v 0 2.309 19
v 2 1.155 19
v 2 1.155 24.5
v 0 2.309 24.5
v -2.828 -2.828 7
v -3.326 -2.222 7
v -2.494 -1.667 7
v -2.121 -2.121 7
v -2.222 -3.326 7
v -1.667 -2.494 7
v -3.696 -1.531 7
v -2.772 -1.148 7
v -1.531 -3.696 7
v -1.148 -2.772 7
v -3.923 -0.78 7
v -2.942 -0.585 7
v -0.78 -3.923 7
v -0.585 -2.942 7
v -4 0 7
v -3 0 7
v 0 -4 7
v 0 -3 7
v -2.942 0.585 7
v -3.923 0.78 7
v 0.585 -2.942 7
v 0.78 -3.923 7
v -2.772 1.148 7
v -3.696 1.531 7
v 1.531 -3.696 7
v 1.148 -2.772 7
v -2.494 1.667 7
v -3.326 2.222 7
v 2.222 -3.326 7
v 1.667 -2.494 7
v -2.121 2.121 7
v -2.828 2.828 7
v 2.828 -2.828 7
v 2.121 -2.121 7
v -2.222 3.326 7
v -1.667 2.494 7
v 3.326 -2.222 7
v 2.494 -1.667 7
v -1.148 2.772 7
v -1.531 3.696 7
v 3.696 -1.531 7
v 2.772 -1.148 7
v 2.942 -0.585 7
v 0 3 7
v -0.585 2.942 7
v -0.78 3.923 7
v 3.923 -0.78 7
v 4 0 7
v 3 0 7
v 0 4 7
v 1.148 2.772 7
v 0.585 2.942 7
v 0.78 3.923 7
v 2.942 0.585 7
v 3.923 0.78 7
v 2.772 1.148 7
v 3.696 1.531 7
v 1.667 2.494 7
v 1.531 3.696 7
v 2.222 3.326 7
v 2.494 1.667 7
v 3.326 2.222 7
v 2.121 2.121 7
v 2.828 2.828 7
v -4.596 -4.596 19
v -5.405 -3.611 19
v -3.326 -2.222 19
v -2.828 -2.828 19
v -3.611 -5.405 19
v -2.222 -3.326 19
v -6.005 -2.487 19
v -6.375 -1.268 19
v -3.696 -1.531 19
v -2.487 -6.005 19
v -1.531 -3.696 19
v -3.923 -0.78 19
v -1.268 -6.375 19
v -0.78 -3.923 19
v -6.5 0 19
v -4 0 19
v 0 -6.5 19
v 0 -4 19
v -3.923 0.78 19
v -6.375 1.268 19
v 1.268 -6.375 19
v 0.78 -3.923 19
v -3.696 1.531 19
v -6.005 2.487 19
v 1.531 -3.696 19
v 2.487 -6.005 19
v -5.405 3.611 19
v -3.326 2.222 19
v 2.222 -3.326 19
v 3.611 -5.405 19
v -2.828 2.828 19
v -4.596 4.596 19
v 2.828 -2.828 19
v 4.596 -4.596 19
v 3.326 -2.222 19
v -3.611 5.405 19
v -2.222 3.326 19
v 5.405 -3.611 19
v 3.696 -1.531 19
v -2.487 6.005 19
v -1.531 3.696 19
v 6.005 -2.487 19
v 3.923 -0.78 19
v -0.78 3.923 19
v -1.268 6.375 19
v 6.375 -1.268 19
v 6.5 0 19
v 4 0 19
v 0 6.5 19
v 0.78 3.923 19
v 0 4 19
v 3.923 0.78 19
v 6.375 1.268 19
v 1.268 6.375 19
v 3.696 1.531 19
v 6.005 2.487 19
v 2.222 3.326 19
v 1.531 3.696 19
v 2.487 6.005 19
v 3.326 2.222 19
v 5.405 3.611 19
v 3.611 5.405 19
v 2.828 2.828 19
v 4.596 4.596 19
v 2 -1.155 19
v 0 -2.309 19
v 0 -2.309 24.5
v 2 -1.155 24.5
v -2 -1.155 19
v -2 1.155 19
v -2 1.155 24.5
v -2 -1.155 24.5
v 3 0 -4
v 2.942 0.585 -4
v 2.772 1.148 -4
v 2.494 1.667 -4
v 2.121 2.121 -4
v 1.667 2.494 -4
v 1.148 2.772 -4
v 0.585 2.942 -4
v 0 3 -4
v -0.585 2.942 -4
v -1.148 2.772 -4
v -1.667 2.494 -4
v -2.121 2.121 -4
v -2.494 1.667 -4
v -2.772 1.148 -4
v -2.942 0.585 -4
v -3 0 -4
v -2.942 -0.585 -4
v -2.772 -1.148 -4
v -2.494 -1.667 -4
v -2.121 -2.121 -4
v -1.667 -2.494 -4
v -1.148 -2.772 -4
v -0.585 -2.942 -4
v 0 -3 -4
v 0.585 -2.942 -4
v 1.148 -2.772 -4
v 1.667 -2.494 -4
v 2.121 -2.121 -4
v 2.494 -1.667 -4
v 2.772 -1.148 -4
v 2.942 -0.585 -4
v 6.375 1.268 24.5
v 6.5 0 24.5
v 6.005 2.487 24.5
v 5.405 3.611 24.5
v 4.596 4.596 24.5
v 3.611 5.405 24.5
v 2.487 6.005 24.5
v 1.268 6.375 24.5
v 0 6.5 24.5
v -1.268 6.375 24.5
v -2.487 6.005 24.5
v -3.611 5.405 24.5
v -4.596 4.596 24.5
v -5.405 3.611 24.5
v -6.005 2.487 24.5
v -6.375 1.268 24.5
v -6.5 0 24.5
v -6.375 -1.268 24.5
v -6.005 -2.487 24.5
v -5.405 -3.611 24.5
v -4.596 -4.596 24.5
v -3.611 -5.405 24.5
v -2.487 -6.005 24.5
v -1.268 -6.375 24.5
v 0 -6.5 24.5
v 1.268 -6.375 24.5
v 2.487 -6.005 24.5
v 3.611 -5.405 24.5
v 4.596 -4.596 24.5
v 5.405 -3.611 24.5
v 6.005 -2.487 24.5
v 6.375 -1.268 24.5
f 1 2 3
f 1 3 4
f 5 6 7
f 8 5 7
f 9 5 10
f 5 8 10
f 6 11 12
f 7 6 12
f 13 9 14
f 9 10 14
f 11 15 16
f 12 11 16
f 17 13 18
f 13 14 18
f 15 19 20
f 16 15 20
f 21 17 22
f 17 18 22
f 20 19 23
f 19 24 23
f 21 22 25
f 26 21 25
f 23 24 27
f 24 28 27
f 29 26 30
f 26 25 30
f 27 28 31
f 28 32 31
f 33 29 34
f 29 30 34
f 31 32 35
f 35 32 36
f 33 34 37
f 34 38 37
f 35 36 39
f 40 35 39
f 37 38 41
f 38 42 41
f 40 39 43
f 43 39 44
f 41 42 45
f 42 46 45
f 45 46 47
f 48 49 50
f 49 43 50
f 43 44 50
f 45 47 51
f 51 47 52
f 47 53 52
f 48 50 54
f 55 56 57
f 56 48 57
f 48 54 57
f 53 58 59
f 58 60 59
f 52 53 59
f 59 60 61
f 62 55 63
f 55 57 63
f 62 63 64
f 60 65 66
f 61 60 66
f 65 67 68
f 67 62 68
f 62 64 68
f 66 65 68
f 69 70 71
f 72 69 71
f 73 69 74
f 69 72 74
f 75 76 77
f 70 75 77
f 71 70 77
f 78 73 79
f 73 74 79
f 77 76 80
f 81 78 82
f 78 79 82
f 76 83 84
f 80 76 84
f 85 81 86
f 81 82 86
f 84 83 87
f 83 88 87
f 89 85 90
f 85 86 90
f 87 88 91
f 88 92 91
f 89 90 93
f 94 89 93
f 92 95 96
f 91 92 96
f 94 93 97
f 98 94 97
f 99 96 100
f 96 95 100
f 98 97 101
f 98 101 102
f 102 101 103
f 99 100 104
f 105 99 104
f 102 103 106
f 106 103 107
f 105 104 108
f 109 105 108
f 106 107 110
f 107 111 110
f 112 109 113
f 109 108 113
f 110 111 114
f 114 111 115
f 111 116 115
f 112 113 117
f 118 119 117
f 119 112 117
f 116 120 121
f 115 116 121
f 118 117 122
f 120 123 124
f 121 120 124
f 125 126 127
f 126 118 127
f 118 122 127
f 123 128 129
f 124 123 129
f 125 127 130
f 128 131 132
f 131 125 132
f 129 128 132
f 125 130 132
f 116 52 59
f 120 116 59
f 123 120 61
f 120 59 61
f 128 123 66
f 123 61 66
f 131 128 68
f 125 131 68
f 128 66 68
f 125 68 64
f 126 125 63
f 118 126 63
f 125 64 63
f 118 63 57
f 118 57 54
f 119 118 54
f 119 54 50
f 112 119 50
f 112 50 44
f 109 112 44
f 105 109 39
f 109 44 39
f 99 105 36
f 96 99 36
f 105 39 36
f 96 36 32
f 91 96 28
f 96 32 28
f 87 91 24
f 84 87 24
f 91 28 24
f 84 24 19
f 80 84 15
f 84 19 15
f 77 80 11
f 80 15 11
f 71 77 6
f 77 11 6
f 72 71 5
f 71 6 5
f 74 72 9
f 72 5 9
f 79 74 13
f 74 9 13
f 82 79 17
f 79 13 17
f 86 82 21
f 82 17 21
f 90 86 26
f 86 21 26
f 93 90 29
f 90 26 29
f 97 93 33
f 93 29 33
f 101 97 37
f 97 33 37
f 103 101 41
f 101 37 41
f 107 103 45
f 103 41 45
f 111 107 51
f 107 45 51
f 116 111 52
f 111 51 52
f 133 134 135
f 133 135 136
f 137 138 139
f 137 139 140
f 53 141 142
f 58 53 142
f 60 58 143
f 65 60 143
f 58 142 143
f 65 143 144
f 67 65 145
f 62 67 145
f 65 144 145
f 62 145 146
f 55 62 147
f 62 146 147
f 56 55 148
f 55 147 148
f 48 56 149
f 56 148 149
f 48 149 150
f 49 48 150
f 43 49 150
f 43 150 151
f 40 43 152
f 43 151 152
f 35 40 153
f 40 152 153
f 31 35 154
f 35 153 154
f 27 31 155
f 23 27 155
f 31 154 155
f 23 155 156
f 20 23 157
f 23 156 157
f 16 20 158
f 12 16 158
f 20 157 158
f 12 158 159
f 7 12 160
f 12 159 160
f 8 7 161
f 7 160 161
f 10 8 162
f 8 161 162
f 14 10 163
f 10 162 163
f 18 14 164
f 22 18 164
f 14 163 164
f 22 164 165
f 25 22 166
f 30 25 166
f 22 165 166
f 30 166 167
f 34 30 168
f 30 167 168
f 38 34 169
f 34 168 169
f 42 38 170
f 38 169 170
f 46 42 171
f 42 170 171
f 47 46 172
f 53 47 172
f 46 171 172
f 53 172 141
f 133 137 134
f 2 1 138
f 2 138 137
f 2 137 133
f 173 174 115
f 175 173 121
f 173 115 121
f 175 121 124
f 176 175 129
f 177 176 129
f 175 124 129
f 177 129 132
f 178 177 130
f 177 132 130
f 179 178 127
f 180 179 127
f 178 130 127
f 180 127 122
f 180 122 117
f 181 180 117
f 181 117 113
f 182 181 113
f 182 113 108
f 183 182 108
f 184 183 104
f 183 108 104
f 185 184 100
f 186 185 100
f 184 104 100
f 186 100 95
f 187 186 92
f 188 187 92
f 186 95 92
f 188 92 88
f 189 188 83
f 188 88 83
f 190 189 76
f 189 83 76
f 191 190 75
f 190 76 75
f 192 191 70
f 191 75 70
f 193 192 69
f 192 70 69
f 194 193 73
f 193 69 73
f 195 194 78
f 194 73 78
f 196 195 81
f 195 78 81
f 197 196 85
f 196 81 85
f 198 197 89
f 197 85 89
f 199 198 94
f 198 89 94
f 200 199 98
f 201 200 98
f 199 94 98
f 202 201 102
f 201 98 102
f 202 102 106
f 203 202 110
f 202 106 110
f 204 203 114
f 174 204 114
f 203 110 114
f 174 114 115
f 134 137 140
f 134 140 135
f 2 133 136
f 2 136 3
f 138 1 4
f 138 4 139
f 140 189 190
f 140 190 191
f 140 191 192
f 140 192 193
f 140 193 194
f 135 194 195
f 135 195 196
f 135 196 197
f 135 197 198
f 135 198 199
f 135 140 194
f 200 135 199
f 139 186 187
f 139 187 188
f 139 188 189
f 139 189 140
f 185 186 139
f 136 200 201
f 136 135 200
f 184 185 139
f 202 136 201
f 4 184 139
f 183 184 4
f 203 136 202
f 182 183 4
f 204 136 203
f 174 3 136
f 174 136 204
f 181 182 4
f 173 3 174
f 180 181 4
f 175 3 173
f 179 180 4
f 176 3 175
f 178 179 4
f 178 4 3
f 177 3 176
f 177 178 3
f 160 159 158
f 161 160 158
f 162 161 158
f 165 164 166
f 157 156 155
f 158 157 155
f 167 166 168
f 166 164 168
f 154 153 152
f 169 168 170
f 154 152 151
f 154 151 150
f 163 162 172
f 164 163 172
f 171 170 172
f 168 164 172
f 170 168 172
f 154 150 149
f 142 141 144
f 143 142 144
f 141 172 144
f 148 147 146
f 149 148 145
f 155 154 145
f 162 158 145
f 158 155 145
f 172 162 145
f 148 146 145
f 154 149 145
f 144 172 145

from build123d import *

# Parameters (mm, degrees)
SHOULDER_START    = 7
PROFILE_1_R       = 4
SHOULDER_DEPTH    = 12
M6_THREAD_START   = -4
PROFILE_2_R       = 3
M6_THREAD_DEPTH   = 11
SOCKET_HEAD_START = 19
PROFILE_3_R       = 6.5
SOCKET_HEAD_DEPTH = 5.5


with BuildPart() as part:
    # Profile_1 → Shoulder (new body)
    with BuildSketch(Plane.XY.offset(SHOULDER_START)):
        Circle(PROFILE_1_R)
    extrude(amount=SHOULDER_DEPTH)

    # Profile_2 → M6_thread (add)
    with BuildSketch(Plane.XY.offset(M6_THREAD_START)):
        Circle(PROFILE_2_R)
    extrude(amount=M6_THREAD_DEPTH)

    # Profile_3 → Socket_head (add)
    with BuildSketch(Plane.XY.offset(SOCKET_HEAD_START)):
        Circle(PROFILE_3_R)
        Polygon((2, 1.154700538), (0, 2.309401077), (-2, 1.154700538), (-2, -1.154700538), (0, -2.309401077), (2, -1.154700538), align=None, mode=Mode.SUBTRACT)
    extrude(amount=SOCKET_HEAD_DEPTH)


solid = part.part
